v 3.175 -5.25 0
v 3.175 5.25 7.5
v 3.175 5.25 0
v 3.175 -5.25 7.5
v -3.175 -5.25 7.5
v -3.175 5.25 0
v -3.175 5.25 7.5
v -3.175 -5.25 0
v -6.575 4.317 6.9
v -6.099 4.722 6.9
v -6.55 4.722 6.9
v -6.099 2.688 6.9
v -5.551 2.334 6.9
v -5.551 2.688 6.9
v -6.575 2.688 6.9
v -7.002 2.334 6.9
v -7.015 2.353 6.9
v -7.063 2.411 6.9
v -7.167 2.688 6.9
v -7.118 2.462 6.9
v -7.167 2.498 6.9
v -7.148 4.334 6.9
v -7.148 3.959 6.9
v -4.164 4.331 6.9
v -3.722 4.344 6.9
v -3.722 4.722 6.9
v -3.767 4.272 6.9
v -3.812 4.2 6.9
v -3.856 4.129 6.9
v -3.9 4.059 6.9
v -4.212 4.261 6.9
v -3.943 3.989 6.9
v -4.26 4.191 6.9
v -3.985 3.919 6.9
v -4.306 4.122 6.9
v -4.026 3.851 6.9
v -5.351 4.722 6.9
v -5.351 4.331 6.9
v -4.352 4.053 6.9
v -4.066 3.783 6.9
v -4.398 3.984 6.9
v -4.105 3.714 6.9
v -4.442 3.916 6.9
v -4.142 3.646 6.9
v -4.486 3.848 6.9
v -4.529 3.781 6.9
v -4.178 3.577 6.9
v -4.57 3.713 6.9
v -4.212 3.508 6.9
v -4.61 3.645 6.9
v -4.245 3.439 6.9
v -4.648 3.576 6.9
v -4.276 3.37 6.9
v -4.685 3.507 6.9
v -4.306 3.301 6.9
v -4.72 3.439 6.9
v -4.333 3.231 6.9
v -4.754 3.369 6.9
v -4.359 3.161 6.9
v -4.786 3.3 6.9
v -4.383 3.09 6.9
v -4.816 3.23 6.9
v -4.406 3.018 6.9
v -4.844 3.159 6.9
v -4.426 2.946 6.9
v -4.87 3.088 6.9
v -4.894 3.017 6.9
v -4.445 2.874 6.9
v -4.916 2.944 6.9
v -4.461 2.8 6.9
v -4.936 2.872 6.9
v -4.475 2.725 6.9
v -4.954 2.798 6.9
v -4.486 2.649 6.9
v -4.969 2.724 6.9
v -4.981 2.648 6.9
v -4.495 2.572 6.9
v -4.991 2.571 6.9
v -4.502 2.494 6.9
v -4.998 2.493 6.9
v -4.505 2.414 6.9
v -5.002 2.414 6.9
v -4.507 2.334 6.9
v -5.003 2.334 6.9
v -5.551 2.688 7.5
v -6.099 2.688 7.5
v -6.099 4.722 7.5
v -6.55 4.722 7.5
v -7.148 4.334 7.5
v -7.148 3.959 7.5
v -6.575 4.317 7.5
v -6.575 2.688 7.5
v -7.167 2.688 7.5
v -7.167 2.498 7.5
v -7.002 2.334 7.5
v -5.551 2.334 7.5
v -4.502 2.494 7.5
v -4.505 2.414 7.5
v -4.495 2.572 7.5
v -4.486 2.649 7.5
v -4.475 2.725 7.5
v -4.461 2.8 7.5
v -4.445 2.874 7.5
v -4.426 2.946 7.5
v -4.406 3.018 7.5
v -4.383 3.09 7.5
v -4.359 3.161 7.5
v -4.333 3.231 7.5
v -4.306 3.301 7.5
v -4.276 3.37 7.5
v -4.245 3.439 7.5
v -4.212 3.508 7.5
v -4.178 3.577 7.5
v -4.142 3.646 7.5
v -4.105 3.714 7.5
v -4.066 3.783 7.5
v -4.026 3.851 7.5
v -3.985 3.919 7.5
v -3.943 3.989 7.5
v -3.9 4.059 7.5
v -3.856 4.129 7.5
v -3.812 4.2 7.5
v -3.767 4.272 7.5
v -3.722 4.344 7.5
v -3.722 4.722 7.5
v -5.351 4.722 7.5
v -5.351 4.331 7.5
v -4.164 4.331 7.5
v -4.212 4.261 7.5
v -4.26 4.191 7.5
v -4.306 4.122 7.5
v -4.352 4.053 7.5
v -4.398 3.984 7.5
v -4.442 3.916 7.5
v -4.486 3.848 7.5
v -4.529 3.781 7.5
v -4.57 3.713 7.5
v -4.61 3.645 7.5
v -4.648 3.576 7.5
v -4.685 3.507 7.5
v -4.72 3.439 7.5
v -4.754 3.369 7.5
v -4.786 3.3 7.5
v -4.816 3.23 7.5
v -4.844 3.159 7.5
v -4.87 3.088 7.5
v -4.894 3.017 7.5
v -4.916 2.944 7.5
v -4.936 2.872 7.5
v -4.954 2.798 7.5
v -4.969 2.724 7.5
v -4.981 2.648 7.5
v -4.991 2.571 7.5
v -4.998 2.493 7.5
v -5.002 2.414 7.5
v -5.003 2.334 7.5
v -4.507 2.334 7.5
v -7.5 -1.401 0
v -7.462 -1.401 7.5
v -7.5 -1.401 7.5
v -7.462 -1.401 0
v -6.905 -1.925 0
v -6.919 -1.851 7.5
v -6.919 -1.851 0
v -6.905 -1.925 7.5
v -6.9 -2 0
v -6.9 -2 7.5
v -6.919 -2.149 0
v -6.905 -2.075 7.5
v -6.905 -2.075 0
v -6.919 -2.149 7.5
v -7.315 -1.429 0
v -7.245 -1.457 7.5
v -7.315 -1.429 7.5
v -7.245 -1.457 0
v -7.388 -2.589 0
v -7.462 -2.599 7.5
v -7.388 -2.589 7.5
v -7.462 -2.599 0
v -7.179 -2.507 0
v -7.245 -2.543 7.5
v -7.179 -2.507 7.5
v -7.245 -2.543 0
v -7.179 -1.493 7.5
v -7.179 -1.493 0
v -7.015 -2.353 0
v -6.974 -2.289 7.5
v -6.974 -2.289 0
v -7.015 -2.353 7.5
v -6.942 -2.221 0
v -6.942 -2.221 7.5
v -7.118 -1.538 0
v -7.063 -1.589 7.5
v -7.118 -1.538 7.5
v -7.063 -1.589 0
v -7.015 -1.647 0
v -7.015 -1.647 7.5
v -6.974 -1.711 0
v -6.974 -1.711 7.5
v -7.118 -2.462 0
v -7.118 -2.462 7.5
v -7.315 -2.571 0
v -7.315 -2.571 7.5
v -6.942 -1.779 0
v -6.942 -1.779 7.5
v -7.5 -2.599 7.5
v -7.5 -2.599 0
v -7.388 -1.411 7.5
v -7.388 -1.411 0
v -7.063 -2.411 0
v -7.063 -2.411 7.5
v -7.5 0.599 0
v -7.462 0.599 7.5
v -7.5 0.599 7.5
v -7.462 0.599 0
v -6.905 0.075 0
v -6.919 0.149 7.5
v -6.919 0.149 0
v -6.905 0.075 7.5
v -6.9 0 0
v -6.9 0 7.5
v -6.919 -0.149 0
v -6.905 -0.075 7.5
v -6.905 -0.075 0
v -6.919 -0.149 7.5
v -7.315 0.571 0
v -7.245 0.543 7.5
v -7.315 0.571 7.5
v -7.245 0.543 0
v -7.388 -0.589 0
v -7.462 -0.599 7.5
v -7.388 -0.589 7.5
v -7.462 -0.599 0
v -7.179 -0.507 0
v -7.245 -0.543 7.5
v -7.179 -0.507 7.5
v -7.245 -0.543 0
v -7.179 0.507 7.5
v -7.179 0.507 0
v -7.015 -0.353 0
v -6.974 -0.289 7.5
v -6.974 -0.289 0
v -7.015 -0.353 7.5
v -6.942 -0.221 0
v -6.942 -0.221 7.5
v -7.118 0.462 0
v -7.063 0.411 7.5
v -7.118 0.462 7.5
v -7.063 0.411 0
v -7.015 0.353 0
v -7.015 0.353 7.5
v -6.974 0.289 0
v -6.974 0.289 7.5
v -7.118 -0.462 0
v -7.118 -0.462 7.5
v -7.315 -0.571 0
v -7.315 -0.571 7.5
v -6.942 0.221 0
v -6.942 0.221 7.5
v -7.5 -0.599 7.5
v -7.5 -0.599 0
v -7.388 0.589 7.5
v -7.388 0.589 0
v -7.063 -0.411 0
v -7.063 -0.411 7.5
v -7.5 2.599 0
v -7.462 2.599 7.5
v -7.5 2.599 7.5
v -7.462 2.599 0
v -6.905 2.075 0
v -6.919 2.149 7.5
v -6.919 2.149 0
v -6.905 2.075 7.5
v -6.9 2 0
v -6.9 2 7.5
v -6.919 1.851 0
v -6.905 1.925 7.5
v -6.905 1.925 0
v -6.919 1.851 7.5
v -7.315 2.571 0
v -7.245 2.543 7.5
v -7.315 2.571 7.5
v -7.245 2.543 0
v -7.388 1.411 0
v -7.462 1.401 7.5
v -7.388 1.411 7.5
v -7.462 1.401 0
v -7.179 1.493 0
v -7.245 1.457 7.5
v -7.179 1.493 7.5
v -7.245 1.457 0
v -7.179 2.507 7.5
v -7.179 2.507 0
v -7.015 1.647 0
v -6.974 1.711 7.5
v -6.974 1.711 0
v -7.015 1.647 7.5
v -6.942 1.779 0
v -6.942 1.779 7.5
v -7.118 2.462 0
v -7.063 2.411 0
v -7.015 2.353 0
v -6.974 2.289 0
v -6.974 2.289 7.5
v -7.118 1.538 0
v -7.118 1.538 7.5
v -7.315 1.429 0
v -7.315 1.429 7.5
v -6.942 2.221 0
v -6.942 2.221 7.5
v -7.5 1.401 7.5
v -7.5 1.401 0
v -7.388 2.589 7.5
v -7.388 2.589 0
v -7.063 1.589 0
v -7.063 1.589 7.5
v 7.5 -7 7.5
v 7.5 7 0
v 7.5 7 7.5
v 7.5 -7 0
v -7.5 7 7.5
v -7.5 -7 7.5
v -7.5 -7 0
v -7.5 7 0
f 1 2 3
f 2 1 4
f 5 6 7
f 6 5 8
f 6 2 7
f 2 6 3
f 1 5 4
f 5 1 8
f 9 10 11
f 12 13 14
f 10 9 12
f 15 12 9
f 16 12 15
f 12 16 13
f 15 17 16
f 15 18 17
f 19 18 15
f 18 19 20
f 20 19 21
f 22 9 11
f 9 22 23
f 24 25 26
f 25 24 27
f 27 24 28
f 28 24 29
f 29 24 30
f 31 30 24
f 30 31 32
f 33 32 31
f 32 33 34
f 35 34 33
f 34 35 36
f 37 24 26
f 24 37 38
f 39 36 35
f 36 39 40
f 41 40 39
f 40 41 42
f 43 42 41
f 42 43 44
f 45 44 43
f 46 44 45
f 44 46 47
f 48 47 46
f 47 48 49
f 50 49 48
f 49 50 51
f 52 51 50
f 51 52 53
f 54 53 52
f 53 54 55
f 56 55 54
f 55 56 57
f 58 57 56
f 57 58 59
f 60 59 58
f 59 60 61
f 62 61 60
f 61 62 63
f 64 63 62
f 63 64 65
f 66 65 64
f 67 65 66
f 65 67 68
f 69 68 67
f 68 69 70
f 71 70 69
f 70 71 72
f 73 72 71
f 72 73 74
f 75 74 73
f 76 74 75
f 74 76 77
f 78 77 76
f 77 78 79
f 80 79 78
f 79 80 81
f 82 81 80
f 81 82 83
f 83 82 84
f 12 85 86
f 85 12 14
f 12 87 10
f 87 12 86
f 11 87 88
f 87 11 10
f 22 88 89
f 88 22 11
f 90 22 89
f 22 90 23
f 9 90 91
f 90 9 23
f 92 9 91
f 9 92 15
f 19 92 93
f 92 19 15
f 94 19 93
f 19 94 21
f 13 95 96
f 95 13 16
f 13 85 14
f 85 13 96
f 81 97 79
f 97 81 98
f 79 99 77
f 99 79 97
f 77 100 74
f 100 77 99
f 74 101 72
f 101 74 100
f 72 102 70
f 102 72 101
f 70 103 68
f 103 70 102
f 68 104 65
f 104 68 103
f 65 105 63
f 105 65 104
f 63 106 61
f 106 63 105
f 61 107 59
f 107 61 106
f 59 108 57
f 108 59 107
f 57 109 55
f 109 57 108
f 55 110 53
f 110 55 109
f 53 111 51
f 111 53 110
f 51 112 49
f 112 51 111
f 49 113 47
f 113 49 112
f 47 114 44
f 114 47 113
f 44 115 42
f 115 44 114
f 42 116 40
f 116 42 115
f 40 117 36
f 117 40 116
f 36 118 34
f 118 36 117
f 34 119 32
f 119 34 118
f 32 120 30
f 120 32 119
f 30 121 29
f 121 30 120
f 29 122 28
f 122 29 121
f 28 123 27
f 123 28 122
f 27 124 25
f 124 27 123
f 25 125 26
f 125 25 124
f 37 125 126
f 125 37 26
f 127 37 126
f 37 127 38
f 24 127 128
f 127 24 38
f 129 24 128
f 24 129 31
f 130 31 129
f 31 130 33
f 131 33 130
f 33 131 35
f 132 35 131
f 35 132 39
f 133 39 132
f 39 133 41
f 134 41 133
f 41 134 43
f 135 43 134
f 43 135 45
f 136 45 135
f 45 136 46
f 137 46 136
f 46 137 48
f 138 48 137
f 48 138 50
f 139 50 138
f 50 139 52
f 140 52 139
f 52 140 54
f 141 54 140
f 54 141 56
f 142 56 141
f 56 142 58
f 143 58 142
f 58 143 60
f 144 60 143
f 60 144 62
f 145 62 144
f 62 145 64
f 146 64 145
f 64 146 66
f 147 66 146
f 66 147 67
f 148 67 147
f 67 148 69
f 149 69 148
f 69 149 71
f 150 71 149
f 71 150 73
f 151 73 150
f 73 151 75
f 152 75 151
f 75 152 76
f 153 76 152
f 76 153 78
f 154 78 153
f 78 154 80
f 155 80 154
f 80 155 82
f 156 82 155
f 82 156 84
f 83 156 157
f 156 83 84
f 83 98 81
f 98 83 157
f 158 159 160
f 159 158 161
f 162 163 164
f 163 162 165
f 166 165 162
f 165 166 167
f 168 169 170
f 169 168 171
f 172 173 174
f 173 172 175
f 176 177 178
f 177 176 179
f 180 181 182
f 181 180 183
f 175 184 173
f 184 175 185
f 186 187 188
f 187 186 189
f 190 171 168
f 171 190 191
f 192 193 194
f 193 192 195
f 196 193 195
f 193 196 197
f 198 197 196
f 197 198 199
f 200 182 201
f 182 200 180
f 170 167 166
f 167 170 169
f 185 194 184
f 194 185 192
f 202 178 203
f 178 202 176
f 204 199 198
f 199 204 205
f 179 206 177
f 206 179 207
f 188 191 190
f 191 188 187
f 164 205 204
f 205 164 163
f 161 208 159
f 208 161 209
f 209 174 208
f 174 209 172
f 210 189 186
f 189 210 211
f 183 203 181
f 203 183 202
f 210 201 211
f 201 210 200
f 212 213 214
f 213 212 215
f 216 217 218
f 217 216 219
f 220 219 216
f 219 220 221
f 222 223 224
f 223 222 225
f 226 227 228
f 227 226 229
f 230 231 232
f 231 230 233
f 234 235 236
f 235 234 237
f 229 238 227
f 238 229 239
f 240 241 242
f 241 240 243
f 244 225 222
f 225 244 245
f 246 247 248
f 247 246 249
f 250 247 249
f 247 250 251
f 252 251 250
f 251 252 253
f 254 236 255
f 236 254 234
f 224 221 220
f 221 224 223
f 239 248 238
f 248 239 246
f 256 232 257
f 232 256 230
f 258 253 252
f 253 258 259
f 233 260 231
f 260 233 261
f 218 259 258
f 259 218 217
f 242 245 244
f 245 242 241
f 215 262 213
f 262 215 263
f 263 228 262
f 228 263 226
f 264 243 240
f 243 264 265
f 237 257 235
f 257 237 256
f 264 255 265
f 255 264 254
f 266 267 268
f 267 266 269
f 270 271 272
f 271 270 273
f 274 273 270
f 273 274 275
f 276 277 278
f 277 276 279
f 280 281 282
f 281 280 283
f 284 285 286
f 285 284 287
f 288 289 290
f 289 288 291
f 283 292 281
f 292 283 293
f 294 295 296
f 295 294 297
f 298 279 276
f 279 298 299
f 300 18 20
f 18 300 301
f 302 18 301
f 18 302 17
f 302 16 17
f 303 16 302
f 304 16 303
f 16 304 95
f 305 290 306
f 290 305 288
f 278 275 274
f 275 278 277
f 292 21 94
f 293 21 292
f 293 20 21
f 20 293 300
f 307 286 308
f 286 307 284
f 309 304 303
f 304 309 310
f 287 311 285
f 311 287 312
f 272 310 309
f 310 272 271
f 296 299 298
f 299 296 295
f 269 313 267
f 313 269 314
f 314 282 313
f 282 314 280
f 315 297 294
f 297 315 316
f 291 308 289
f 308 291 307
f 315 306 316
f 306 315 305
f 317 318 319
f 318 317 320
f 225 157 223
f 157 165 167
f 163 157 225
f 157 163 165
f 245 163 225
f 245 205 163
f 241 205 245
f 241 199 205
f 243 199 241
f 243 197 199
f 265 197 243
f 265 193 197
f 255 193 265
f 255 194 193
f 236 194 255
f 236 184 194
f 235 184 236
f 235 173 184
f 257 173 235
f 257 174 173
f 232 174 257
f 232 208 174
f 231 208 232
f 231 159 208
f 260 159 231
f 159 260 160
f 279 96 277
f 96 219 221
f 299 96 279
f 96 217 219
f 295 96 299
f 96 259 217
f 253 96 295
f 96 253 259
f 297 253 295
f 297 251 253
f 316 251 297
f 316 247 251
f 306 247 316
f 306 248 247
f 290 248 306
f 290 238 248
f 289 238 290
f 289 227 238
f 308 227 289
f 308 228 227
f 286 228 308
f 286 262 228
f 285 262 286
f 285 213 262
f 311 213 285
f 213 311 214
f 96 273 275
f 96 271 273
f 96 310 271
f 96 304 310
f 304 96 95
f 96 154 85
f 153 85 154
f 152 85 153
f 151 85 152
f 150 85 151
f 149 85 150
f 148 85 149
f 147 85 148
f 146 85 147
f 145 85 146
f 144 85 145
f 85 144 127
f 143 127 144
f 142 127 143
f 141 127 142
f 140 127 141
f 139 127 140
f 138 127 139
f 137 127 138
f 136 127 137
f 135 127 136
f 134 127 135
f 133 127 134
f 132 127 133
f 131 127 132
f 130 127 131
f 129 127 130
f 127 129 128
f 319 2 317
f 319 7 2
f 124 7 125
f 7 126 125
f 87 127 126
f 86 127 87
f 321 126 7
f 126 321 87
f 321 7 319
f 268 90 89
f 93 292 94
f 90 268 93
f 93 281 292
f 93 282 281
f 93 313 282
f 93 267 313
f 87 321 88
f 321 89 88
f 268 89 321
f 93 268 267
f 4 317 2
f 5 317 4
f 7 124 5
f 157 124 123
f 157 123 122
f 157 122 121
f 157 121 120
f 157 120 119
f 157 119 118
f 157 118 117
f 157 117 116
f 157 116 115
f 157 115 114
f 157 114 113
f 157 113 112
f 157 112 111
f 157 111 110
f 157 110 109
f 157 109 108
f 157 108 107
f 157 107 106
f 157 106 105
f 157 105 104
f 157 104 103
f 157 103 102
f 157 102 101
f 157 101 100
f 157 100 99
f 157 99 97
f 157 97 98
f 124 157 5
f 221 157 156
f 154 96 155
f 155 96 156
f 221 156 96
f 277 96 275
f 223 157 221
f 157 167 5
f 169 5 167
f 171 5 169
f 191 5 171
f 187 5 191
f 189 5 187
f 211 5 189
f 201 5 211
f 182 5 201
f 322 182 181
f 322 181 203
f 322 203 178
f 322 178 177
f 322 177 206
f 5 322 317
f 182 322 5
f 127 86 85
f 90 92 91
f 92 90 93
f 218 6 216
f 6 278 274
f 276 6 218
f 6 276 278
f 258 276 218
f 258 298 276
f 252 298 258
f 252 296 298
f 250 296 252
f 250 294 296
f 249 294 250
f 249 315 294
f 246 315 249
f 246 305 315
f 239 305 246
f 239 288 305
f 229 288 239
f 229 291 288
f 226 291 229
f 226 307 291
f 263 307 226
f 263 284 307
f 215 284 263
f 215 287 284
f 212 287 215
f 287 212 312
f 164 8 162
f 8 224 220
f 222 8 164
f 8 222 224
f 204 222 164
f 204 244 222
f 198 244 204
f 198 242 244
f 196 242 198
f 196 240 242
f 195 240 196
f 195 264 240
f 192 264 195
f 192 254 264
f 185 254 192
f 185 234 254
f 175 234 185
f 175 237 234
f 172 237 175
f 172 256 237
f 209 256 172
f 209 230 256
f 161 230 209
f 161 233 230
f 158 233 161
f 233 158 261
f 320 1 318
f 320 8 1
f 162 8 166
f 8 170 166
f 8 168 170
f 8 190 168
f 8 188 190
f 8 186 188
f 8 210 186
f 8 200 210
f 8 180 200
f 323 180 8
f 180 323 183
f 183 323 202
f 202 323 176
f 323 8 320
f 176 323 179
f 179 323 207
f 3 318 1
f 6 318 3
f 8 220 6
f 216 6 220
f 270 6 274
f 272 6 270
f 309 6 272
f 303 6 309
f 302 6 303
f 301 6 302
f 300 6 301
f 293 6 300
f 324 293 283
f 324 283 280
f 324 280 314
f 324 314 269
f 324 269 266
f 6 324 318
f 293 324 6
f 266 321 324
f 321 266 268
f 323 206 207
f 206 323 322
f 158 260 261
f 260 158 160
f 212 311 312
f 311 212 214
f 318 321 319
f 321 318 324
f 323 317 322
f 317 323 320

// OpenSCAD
$fn = 50;

difference() {
	union() {
		translate(v = [0, -5, 0]) {
			rotate(a = [0, 0, 0]) {
				difference() {
					union() {
						translate(v = [-7.5, -2.0, 0]) {
							cube(size = [15.0, 14.0, 7.5]);
						}
					}
					union() {
						translate(v = [-3.175, -0.25, -0.1]) {
							cube(size = [6.35, 10.5, 7.7]);
						}
						translate(v = [-5.5, 8.5, 6.9]) {
							linear_extrude(height = 0.7) {
								text(font = "Arial:style=Bold", halign = "center", size = 2.5, text = "17", valign = "center");
							}
						}
						translate(v = [-7.5, 3, -0.1]) {
							cylinder(h = 7.7, r = 0.6);
						}
						translate(v = [-7.5, 5, -0.1]) {
							cylinder(h = 7.7, r = 0.6);
						}
						translate(v = [-7.5, 7, -0.1]) {
							cylinder(h = 7.7, r = 0.6);
						}
					}
				}
			}
		}
	}
	union();
}
